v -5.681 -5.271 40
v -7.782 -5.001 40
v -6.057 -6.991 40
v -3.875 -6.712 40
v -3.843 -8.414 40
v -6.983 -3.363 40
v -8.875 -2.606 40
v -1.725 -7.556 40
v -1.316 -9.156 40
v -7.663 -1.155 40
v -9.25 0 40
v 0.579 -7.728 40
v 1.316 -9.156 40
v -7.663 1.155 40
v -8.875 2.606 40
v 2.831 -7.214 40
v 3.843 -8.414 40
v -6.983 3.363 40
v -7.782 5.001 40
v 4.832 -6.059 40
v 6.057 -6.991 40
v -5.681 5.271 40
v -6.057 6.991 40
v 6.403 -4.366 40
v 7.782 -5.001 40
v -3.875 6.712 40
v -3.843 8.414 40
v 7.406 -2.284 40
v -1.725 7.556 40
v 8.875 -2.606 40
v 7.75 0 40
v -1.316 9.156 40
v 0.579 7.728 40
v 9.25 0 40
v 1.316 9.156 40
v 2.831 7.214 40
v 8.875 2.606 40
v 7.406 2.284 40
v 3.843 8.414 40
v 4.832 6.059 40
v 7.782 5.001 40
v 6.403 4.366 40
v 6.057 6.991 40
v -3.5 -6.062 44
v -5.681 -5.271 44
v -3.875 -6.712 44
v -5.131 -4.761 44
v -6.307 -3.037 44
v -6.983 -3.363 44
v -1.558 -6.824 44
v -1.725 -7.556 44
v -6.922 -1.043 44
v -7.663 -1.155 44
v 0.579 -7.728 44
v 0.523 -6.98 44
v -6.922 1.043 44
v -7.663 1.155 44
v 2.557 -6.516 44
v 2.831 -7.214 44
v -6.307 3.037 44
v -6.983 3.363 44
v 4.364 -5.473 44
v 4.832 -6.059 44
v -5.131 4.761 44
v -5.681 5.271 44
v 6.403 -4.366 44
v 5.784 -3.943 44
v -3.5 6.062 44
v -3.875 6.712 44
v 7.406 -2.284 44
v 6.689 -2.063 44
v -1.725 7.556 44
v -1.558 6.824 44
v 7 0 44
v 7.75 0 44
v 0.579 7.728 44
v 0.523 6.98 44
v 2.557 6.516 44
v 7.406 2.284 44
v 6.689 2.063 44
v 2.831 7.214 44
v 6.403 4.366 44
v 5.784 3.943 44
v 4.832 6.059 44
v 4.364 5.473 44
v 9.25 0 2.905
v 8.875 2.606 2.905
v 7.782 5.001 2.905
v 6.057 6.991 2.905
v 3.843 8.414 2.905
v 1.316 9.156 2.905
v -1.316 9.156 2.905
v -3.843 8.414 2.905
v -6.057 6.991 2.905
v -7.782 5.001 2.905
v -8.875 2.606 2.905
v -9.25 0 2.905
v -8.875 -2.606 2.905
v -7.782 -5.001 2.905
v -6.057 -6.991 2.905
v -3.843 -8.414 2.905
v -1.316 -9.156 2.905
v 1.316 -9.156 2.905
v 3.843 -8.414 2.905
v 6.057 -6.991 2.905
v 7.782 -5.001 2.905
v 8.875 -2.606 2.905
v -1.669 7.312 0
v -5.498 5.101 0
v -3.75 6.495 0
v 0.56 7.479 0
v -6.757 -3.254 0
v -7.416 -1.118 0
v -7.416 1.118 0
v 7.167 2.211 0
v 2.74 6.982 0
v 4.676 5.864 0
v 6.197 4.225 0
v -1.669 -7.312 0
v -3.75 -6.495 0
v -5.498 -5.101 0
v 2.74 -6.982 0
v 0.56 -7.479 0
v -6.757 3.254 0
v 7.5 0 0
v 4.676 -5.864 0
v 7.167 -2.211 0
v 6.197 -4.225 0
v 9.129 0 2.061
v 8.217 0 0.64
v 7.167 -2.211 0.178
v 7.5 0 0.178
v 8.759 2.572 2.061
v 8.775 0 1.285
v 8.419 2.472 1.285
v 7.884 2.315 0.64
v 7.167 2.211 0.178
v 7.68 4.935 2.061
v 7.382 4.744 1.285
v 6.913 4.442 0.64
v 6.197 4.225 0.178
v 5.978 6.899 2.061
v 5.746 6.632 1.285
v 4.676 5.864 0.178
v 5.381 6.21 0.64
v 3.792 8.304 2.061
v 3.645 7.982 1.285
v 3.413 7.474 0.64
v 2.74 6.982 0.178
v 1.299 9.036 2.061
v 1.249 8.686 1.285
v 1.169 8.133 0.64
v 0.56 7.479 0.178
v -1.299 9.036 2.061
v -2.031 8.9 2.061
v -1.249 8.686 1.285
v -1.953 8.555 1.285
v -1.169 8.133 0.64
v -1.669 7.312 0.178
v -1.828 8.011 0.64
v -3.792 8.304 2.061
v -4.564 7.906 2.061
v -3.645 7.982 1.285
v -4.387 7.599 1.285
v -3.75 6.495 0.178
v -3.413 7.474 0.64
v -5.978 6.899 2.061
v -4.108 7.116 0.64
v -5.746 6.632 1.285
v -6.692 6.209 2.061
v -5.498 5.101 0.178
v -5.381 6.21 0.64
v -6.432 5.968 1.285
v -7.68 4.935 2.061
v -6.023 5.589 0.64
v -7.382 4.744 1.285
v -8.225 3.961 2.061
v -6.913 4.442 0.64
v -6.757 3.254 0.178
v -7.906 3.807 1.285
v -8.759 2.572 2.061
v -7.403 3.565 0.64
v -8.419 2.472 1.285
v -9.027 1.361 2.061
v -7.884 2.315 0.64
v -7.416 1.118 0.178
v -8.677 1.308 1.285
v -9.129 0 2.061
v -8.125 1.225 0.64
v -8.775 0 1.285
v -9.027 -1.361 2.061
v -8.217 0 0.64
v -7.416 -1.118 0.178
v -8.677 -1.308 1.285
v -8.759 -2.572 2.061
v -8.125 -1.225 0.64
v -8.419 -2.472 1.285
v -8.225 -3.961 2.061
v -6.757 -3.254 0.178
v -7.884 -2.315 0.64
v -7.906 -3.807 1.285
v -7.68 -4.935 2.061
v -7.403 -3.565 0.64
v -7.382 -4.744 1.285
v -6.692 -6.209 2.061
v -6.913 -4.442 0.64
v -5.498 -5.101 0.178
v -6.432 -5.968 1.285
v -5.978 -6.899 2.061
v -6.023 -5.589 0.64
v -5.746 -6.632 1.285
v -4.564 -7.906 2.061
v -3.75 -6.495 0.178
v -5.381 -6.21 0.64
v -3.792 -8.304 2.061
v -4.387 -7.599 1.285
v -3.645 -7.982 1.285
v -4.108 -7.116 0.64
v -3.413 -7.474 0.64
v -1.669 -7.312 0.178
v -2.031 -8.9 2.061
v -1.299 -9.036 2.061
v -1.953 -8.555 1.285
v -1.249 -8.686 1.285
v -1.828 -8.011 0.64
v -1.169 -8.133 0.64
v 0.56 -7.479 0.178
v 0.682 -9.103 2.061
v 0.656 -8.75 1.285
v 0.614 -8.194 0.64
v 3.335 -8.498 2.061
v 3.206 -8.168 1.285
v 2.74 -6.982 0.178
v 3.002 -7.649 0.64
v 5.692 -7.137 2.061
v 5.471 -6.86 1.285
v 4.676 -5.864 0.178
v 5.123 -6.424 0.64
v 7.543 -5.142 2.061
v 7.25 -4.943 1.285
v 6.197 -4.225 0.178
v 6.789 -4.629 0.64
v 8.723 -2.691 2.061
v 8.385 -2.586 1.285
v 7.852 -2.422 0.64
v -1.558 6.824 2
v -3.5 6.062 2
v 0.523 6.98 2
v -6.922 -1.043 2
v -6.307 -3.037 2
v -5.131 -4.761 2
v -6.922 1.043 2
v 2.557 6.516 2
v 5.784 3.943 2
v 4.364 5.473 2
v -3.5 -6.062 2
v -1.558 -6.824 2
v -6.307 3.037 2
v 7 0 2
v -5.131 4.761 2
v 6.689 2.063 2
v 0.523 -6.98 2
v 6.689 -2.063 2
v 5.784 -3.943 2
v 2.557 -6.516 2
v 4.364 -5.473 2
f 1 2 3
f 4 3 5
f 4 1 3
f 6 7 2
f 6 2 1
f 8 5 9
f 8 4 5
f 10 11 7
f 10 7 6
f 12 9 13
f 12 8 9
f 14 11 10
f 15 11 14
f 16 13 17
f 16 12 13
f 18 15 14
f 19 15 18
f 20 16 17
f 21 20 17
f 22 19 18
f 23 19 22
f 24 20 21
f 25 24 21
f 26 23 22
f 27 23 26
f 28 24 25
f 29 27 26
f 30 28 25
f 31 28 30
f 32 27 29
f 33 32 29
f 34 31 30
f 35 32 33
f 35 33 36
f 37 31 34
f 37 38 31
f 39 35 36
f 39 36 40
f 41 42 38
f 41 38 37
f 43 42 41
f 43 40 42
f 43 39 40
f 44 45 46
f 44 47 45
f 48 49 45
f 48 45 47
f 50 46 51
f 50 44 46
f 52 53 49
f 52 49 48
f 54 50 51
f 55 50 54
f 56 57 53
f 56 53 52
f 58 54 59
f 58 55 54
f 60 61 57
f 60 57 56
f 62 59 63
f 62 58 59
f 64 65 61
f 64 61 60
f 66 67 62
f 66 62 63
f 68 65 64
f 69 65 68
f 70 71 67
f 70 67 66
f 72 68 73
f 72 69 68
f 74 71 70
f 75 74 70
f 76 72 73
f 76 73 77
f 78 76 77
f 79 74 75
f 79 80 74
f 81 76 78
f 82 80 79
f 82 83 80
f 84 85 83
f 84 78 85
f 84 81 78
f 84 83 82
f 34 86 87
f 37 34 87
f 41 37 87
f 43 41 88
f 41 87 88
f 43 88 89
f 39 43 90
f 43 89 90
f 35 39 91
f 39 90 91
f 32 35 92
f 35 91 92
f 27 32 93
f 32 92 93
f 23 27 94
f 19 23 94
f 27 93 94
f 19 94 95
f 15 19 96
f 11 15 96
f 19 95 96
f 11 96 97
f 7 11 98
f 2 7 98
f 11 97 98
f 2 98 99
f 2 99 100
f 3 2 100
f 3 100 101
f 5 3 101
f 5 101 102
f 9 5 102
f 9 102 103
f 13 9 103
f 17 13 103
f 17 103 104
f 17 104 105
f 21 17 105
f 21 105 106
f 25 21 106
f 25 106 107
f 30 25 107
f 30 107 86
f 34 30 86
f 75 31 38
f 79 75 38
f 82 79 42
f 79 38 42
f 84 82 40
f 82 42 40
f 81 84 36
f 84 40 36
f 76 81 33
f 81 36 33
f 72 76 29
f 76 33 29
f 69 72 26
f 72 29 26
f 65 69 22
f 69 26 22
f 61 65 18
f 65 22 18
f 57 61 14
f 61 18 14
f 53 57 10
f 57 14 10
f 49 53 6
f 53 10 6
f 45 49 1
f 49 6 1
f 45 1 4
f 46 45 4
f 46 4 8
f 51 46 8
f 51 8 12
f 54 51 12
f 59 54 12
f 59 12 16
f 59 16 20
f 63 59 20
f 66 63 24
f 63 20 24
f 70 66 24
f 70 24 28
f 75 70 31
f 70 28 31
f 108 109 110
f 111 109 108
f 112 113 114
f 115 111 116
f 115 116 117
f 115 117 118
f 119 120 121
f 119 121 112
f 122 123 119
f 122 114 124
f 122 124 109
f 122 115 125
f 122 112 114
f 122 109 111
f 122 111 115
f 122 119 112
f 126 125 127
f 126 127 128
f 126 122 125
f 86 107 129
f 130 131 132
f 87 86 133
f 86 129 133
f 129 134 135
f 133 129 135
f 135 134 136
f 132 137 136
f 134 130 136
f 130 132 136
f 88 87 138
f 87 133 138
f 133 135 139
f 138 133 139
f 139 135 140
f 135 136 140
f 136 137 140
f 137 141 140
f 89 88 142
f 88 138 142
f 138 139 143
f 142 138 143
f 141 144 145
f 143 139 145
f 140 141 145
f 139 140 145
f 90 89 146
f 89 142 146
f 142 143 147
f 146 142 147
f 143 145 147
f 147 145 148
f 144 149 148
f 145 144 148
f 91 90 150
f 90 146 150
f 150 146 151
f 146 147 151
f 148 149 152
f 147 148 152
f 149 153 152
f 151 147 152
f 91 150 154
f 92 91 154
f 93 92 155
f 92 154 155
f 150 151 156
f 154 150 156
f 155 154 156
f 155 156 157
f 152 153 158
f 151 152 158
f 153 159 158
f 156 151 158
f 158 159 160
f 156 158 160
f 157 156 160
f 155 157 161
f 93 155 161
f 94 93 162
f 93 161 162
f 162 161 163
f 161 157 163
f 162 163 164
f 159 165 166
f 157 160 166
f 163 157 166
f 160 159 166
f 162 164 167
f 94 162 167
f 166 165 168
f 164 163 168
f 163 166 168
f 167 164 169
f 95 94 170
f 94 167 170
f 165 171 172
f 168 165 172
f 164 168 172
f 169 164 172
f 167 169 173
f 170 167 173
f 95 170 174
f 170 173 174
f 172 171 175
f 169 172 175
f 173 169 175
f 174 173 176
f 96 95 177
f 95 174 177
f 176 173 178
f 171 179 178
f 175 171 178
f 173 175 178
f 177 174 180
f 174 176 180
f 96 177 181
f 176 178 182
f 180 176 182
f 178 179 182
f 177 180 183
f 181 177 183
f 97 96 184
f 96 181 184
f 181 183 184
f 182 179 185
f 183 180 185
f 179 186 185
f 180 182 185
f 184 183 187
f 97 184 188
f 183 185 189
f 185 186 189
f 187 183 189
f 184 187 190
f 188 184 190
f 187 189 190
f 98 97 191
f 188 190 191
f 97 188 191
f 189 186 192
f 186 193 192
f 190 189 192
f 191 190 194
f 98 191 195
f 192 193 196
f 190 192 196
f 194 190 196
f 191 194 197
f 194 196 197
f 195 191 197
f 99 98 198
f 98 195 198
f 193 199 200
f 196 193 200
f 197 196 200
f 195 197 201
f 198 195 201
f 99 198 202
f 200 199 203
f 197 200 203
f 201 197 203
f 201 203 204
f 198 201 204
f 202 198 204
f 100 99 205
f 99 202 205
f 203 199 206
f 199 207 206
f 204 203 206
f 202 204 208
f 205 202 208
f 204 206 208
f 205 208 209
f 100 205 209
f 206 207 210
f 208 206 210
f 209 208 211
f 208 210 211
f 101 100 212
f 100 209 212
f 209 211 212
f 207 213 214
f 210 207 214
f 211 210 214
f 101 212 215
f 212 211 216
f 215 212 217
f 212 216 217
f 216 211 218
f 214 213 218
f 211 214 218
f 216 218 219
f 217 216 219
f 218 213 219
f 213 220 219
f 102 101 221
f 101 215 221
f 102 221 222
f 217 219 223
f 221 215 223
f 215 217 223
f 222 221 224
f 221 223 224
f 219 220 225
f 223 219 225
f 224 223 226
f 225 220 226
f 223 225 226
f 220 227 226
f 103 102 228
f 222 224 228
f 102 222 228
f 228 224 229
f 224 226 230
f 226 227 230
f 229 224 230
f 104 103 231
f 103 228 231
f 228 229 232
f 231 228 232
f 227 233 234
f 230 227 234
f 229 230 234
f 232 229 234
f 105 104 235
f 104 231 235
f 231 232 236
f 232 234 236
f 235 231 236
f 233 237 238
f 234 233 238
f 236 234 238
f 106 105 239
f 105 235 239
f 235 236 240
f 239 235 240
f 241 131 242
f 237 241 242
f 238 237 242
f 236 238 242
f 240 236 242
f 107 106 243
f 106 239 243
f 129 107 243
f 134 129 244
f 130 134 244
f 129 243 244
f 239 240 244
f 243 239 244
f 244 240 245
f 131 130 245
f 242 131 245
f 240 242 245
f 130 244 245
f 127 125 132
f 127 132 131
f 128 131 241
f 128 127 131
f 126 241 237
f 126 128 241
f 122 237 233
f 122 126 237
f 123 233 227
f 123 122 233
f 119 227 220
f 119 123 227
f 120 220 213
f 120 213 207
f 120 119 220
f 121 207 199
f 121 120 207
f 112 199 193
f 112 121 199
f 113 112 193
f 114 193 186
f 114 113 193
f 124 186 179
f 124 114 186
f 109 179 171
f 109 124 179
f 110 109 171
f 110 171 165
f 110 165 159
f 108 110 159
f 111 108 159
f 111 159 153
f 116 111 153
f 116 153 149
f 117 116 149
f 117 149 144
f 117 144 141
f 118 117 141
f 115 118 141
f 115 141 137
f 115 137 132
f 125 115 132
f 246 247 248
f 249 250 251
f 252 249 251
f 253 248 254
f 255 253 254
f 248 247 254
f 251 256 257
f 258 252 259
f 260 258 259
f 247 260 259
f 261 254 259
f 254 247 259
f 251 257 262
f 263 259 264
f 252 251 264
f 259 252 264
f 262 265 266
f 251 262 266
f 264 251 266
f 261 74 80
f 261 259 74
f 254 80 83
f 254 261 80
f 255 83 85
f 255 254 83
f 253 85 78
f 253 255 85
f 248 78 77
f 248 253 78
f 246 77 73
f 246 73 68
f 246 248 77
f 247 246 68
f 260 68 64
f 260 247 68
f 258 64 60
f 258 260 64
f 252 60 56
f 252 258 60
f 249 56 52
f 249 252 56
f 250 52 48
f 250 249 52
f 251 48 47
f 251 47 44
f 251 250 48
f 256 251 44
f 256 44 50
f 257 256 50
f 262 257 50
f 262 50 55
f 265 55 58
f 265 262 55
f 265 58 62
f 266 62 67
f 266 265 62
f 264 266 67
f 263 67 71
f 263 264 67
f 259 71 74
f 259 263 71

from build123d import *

# Parameters (mm, degrees)
F0_R     = 9.25
F0_R_2   = 7
F1_DEPTH = 40
F2_R     = 7.5
F4_DEPTH = 2
F5_R     = 7.75
F5_R_2   = 7
F6_DEPTH = 4


# Not quite as in the source:
# - a fillet or chamfer that OpenCascade refuses, or shapes differently, is made with other operations: its cross-section is extruded or revolved along the edge and cut away or added


with BuildPart() as f1:
    # F0 (on Top) → F1 (new body)
    with BuildSketch(Plane.XY):
        Circle(F0_R)
        Circle(F0_R_2, mode=Mode.SUBTRACT)
    extrude(amount=F1_DEPTH)

    # F3: fillet of radius 3 on 1 edges, made by hand

    # F3_s1 → F3_t2 (revolve, cut)
    with BuildSketch(Plane.XZ):
        with BuildLine():
            ThreePointArc((9.25, 2.9047375097), (8.6217082451, 1.0676202026), (7, 0))
            Line((7, 0), (9.25, 0))
            Line((9.25, 0), (9.25, 2.9047375097))
        make_face()
    revolve(axis=Axis((0, 0, 0), (0, 0, 1)), mode=Mode.SUBTRACT)

    # F2 (on face) → F4 (join)
    with BuildSketch(Plane(origin=(0, 0, 0), x_dir=(1, 0, 0), z_dir=(0, 0, -1))):
        Circle(F2_R)
    extrude(amount=-F4_DEPTH)

    # F5 (on face) → F6 (join)
    with BuildSketch(Plane.XY.offset(40)):
        Circle(F5_R)
        Circle(F5_R_2, mode=Mode.SUBTRACT)
    extrude(amount=F6_DEPTH)


solid = f1.part
